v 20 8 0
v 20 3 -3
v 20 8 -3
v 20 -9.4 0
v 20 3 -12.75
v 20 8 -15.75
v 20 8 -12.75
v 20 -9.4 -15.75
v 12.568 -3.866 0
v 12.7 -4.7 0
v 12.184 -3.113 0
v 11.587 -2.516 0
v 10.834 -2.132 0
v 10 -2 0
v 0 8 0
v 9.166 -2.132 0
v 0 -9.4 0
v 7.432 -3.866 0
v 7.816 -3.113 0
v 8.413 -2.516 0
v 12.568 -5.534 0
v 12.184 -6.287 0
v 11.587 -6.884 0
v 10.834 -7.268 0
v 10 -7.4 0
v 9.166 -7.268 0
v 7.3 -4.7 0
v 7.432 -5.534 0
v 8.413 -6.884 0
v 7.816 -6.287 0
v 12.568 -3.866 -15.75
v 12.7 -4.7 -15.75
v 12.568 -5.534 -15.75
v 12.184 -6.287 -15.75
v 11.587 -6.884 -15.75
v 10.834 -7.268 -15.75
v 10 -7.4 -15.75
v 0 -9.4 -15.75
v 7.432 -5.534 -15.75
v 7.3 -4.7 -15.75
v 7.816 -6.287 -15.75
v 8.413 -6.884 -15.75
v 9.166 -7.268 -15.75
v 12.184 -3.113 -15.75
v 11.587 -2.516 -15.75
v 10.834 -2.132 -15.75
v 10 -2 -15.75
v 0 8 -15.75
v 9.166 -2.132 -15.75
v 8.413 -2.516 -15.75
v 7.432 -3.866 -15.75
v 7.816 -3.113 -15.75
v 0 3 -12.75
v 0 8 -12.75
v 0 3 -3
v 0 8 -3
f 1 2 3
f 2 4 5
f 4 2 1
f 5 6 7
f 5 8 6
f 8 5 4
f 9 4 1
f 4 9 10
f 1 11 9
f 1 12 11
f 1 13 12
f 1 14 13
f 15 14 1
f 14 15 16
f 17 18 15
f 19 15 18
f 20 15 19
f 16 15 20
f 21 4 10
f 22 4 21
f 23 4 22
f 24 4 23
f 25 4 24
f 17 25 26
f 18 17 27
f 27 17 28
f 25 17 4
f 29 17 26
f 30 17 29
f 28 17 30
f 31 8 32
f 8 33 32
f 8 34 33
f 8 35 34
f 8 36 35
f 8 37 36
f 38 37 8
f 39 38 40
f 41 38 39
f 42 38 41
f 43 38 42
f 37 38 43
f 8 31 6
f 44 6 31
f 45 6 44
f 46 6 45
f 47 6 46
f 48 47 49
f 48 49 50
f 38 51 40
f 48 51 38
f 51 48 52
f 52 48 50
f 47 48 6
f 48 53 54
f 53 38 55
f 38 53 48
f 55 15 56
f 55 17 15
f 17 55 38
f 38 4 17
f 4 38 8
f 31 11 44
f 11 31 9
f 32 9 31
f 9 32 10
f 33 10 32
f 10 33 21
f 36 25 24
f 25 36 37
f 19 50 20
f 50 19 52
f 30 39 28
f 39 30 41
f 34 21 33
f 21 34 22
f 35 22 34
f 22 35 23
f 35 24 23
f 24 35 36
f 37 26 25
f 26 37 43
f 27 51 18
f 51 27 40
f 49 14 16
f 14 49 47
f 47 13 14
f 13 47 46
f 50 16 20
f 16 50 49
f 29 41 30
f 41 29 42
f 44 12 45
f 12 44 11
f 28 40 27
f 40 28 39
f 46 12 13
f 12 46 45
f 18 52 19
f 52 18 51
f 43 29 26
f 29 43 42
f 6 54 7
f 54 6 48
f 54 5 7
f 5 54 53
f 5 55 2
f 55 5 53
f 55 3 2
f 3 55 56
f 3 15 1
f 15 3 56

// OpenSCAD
/* [General] */
build = "dialmount"; // [dialmount, clamptest]

/* [Clamp] */
// How much extra slop for the clamp. Use the clamptest print to determine the proper value.
clamp_clearance = 0.1;

// How far back you want the clamp to extend. 5mm is about the furthest you can go without hitting the x-axis V rail.
lip_depth = 5;

// How long you want your clamp to be.
clamp_length = 20;

// How thick the clamp walls should be.
wall_thickness = 3;

/* [Indicator] */
// Outer diameter of the indicator dial shaft.
shaft_od = 5;

// How much extra space you need to fit.
shaft_clearance = .2;

// How far off from the gantry face you want the edge of the shaft hole to be offset.
hole_border = 2;



/* [Hidden] */
// Thickness of the gantry along the front.
clamp_gap = 9.65;
hole_radius = shaft_od / 2 + shaft_clearance;
hole_center = hole_border + hole_radius;
slop = 0.1;

module clamp(h, c = clamp_clearance) {
  linear_extrude(height = h)
  difference() {
    translate([-wall_thickness, -wall_thickness])
    square([clamp_gap + c + 2*wall_thickness, lip_depth + wall_thickness]);

    square([clamp_gap + c, lip_depth + slop]);
  }
}

clamp_height = 2*wall_thickness + clamp_gap + clamp_clearance;

module dial_mount() {
  // clamp
  rotate([0, 90, 0])
  translate([wall_thickness, wall_thickness, 0])
  clamp(clamp_length);

  // shelf
  shelf_length = 2 * (hole_border + hole_radius);

  difference() {
    translate([0, -shelf_length, -clamp_height])
    cube([clamp_length, shelf_length, clamp_height]);

    translate([clamp_length / 2, -hole_center, -clamp_height - slop])
    cylinder(h = clamp_height + 2 * slop, r = hole_radius, $fn = 20);
  }
}

module clamp_test() {
  for (i = [0 : 3]) {
    translate([18 * i, 0]) clamp(10, i * .1);
  }
}

if (build == "dialmount") dial_mount();
else clamp_test();
